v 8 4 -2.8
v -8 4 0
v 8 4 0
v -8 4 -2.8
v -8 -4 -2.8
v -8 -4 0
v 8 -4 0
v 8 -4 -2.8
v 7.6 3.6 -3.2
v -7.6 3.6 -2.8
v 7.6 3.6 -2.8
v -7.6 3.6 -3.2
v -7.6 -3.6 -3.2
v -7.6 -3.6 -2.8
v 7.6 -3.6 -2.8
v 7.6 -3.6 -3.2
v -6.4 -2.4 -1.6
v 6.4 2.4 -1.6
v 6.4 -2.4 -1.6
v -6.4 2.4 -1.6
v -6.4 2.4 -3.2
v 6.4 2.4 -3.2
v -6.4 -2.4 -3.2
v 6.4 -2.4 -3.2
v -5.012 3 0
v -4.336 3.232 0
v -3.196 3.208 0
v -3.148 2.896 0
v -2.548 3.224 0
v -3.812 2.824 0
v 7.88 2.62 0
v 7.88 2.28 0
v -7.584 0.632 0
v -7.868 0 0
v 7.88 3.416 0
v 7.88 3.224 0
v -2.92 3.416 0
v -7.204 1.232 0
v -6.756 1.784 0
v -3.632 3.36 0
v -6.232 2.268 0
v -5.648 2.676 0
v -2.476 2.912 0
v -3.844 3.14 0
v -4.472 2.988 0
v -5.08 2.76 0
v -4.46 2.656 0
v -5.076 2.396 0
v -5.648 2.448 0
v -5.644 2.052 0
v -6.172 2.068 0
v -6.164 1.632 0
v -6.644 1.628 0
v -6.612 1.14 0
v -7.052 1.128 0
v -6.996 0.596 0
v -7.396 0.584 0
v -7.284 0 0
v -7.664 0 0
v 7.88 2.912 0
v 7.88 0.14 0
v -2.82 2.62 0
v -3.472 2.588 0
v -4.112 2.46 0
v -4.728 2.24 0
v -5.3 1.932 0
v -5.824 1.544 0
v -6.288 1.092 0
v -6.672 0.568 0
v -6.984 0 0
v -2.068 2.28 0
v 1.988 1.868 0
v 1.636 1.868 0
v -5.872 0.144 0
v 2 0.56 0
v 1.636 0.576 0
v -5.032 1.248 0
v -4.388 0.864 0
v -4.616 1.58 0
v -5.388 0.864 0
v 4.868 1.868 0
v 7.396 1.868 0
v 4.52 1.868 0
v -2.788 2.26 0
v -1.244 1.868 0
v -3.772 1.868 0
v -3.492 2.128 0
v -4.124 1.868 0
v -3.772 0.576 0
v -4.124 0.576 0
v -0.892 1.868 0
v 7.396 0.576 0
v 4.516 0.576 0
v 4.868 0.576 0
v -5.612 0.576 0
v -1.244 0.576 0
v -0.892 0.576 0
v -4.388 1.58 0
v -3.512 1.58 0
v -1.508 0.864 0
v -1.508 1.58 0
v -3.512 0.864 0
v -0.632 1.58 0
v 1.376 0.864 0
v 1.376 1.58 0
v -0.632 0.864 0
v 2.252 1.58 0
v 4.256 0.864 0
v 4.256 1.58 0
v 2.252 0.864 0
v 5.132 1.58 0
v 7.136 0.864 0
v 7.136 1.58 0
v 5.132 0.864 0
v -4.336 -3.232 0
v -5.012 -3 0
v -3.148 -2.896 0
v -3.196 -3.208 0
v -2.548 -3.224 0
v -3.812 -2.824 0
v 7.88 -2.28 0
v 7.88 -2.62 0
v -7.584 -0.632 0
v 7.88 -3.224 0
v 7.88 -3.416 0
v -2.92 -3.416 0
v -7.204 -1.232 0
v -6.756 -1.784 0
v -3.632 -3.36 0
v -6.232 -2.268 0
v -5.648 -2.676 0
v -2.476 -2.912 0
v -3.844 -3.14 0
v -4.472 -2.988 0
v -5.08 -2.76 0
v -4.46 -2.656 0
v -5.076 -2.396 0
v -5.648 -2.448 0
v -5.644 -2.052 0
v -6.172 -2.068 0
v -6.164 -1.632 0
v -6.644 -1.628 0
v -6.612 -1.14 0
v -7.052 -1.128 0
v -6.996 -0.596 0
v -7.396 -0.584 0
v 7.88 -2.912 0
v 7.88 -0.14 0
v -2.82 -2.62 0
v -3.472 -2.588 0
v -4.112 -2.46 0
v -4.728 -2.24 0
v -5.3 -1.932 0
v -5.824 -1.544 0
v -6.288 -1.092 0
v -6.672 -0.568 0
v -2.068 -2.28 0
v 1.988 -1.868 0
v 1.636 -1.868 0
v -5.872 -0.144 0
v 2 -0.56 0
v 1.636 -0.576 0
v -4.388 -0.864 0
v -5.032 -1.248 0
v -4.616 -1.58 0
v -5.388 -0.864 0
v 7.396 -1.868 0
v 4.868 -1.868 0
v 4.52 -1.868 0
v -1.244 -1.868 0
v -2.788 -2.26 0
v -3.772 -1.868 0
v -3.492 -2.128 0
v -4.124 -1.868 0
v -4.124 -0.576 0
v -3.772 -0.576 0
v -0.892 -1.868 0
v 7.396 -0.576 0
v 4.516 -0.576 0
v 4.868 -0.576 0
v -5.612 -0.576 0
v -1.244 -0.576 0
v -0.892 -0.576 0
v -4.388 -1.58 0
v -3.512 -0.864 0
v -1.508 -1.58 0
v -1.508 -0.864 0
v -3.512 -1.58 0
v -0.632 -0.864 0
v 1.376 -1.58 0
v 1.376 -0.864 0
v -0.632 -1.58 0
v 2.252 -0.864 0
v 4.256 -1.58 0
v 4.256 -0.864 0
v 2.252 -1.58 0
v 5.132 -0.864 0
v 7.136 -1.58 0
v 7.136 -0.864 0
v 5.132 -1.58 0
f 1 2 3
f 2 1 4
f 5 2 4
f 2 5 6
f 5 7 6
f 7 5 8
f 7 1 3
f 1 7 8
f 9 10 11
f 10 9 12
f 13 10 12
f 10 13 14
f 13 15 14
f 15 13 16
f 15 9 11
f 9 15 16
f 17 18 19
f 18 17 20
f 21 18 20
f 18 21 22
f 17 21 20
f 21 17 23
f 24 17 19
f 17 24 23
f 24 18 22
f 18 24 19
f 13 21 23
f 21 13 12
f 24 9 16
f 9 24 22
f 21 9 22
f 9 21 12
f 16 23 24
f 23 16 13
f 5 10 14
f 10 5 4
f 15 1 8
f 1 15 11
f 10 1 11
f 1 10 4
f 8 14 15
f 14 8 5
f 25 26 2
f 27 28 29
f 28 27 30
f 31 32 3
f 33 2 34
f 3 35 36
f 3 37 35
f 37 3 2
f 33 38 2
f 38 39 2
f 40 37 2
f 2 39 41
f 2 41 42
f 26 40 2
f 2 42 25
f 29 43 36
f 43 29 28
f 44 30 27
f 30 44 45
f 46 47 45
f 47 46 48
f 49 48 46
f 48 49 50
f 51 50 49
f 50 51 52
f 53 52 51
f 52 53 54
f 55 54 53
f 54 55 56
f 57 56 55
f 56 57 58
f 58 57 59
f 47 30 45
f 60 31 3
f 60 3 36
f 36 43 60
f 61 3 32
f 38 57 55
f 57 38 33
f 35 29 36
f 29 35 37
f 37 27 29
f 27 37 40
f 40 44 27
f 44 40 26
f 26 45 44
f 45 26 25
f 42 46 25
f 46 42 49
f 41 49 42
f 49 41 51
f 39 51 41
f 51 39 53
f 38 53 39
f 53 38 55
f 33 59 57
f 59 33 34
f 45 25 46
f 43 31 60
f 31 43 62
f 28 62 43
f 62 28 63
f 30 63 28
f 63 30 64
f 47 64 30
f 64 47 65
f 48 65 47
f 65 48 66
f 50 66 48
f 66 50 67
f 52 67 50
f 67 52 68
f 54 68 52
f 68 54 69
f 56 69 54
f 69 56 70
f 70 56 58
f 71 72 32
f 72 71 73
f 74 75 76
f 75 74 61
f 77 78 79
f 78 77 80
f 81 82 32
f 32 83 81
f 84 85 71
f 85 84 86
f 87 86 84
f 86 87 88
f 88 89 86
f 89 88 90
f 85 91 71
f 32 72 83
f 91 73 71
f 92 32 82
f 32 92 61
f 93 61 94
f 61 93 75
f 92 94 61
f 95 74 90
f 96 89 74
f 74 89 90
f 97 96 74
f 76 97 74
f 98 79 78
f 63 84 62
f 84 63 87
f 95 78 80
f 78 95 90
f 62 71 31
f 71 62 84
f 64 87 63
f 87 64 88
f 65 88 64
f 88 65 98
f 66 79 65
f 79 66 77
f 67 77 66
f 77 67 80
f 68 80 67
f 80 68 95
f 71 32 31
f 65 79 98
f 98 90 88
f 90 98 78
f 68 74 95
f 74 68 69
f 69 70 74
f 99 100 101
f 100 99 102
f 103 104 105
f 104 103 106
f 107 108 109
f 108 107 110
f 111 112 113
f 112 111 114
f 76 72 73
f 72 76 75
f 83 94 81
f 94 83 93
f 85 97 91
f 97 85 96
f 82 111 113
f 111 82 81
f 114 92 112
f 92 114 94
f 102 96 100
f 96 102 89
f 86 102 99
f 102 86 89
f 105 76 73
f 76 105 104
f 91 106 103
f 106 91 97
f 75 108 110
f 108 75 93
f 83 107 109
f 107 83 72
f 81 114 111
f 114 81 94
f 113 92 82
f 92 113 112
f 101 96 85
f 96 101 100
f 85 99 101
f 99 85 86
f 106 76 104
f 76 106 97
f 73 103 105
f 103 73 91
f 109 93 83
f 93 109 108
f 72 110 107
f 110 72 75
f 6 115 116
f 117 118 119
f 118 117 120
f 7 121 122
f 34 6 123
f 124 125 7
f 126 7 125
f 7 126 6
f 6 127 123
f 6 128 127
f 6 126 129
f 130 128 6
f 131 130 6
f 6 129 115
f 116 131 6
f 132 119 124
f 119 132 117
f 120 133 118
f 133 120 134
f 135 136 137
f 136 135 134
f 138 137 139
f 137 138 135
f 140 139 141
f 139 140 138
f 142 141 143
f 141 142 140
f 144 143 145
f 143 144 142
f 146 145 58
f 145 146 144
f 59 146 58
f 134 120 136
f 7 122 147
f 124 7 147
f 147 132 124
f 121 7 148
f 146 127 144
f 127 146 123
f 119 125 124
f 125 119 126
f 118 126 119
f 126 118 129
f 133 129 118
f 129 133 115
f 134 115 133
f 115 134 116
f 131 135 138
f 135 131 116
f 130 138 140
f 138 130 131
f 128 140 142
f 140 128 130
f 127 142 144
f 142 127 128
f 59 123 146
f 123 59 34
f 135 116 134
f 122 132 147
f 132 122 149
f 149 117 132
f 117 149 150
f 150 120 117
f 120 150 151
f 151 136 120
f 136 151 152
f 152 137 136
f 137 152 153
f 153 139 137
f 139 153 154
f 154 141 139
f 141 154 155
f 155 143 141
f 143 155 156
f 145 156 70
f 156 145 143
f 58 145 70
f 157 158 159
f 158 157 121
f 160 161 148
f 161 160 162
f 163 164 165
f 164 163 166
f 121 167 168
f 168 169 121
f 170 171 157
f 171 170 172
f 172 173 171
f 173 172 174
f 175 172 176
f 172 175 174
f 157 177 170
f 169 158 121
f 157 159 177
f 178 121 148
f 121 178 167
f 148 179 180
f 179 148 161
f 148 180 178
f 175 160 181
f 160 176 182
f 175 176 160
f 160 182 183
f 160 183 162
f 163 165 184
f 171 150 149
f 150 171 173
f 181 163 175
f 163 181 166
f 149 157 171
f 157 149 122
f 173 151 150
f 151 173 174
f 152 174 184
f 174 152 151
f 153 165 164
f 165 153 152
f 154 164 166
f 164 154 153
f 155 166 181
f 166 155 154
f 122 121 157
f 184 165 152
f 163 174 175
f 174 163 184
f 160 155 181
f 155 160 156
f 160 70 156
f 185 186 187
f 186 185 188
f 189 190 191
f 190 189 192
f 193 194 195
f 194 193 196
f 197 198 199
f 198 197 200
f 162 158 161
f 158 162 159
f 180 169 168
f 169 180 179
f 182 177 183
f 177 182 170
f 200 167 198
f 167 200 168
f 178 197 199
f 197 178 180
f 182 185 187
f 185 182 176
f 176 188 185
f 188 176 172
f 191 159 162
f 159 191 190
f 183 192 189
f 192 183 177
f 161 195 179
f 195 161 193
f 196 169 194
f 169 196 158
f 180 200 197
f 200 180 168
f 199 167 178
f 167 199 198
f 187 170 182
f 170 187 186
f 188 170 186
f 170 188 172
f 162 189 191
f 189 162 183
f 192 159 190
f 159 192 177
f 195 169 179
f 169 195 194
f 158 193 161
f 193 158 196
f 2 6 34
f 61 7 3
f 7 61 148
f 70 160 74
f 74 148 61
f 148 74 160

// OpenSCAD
// file: ../p/box5.scad
use <../lib.scad>
function ldraw_lib__box5() = [
// 0 Box with 5 Faces and All Edges
// 0 Name: box5.dat
// 0 Author: James Jessiman
// 0 !LDRAW_ORG Primitive UPDATE 2012-01
// 0 !LICENSE Licensed under CC BY 4.0 : see CAreadme.txt
// 
// 0 BFC CERTIFY CCW
  [0,"BFC","CERTIFY"],
  [0,"BFC","CCW"],
// 
// 0 !HISTORY 2002-04-03 [sbliss] Modified for BFC compliance
// 0 !HISTORY 2002-04-25 [PTadmin] Official Update 2002-02
// 0 !HISTORY 2007-06-24 [PTadmin] Header formatted for Contributor Agreement
// 0 !HISTORY 2008-07-01 [PTadmin] Official Update 2008-01
// 0 !HISTORY 2012-02-16 [Philo] Changed to CCW
// 0 !HISTORY 2012-03-30 [PTadmin] Official Update 2012-01
// 
// 
// 2 24 1 1 1 -1 1 1
  [2,24,1,1,1,-1,1,1],
// 2 24 -1 1 1 -1 1 -1
  [2,24,-1,1,1,-1,1,-1],
// 2 24 -1 1 -1 1 1 -1
  [2,24,-1,1,-1,1,1,-1],
// 2 24 1 1 -1 1 1 1
  [2,24,1,1,-1,1,1,1],
// 2 24 1 0 1 -1 0 1
  [2,24,1,0,1,-1,0,1],
// 2 24 -1 0 1 -1 0 -1
  [2,24,-1,0,1,-1,0,-1],
// 2 24 -1 0 -1 1 0 -1
  [2,24,-1,0,-1,1,0,-1],
// 2 24 1 0 -1 1 0 1
  [2,24,1,0,-1,1,0,1],
// 2 24 1 0 1 1 1 1
  [2,24,1,0,1,1,1,1],
// 2 24 -1 0 1 -1 1 1
  [2,24,-1,0,1,-1,1,1],
// 2 24 1 0 -1 1 1 -1
  [2,24,1,0,-1,1,1,-1],
// 2 24 -1 0 -1 -1 1 -1
  [2,24,-1,0,-1,-1,1,-1],
// 4 16 -1 1 1 1 1 1 1 1 -1 -1 1 -1
  [4,16,-1,1,1,1,1,1,1,1,-1,-1,1,-1],
// 4 16 -1 1 1 -1 0 1 1 0 1 1 1 1
  [4,16,-1,1,1,-1,0,1,1,0,1,1,1,1],
// 4 16 -1 1 -1 -1 0 -1 -1 0 1 -1 1 1
  [4,16,-1,1,-1,-1,0,-1,-1,0,1,-1,1,1],
// 4 16 1 1 -1 1 0 -1 -1 0 -1 -1 1 -1
  [4,16,1,1,-1,1,0,-1,-1,0,-1,-1,1,-1],
// 4 16 1 1 1 1 0 1 1 0 -1 1 1 -1
  [4,16,1,1,1,1,0,1,1,0,-1,1,1,-1],
];
module ldraw_lib__box5(step=0, col=false, unit=2/5, alt=false, line=0.2, solid=!$preview)
    makepoly(ldraw_lib__box5(), step=step, col=col, unit=unit, alt=alt, line=line, solid=solid);
ldraw_lib__box5(line=0.2);
// file: ../p/box4.scad
use <../lib.scad>
function ldraw_lib__box4() = [
// 0 Box with 4 Faces (2 Parallel Pairs) and All Edges
// 0 Name: box4.dat
// 0 Author: James Jessiman
// 0 !LDRAW_ORG Primitive UPDATE 2012-01
// 0 !LICENSE Licensed under CC BY 4.0 : see CAreadme.txt
// 
// 0 BFC CERTIFY CCW
  [0,"BFC","CERTIFY"],
  [0,"BFC","CCW"],
// 
// 0 !HISTORY 2002-04-03 [sbliss] Modified for BFC compliance
// 0 !HISTORY 2002-04-25 [PTadmin] Official Update 2002-02
// 0 !HISTORY 2007-06-24 [PTadmin] Header formatted for Contributor Agreement
// 0 !HISTORY 2008-07-01 [PTadmin] Official Update 2008-01
// 0 !HISTORY 2012-02-16 [Philo] Changed to CCW
// 0 !HISTORY 2012-03-30 [PTadmin] Official Update 2012-01
// 
// 
// 2 24 1 1 1 -1 1 1
  [2,24,1,1,1,-1,1,1],
// 2 24 -1 1 1 -1 1 -1
  [2,24,-1,1,1,-1,1,-1],
// 2 24 -1 1 -1 1 1 -1
  [2,24,-1,1,-1,1,1,-1],
// 2 24 1 1 -1 1 1 1
  [2,24,1,1,-1,1,1,1],
// 2 24 1 0 1 -1 0 1
  [2,24,1,0,1,-1,0,1],
// 2 24 -1 0 1 -1 0 -1
  [2,24,-1,0,1,-1,0,-1],
// 2 24 -1 0 -1 1 0 -1
  [2,24,-1,0,-1,1,0,-1],
// 2 24 1 0 -1 1 0 1
  [2,24,1,0,-1,1,0,1],
// 2 24 1 0 1 1 1 1
  [2,24,1,0,1,1,1,1],
// 2 24 -1 0 1 -1 1 1
  [2,24,-1,0,1,-1,1,1],
// 2 24 1 0 -1 1 1 -1
  [2,24,1,0,-1,1,1,-1],
// 2 24 -1 0 -1 -1 1 -1
  [2,24,-1,0,-1,-1,1,-1],
// 4 16 -1 1 1 -1 0 1 1 0 1 1 1 1
  [4,16,-1,1,1,-1,0,1,1,0,1,1,1,1],
// 4 16 -1 1 -1 -1 0 -1 -1 0 1 -1 1 1
  [4,16,-1,1,-1,-1,0,-1,-1,0,1,-1,1,1],
// 4 16 1 1 -1 1 0 -1 -1 0 -1 -1 1 -1
  [4,16,1,1,-1,1,0,-1,-1,0,-1,-1,1,-1],
// 4 16 1 1 1 1 0 1 1 0 -1 1 1 -1
  [4,16,1,1,1,1,0,1,1,0,-1,1,1,-1],
];
module ldraw_lib__box4(step=0, col=false, unit=2/5, alt=false, line=0.2, solid=!$preview)
    makepoly(ldraw_lib__box4(), step=step, col=col, unit=unit, alt=alt, line=line, solid=solid);
ldraw_lib__box4(line=0.2);
// file: s/3069bs01.scad
use <../../lib.scad>
use <../../p/box4.scad>
use <../../p/box5.scad>
function ldraw_lib__s__3069bs01() = [
// 0 ~Tile  1 x  2 with Groove without Top Face
// 0 Name: s\3069bs01.dat
// 0 Author: Santeri Piippo [arezey]
// 0 !LDRAW_ORG Subpart UPDATE 2010-02
// 0 !LICENSE Licensed under CC BY 4.0 : see CAreadme.txt
// 
// 0 BFC CERTIFY CCW
  [0,"BFC","CERTIFY"],
  [0,"BFC","CCW"],
// 
// 0 !HISTORY 2010-07-05 [PTadmin] Official Update 2010-02
// 
// 
// 1 16 0 0 0 20 0 0 0 7 0 0 0 10 box4.dat
  [1,16,0,0,0,20,0,0,0,7,0,0,0,10, ldraw_lib__box4()],
// 1 16 0 7 0 19 0 0 0 1 0 0 0 9 box4.dat
  [1,16,0,7,0,19,0,0,0,1,0,0,0,9, ldraw_lib__box4()],
// 0 BFC INVERTNEXT
  [0,"BFC","INVERTNEXT"],
// 1 16 0 8 0 16 0 0 0 -4 0 0 0 6 box5.dat
  [1,16,0,8,0,16,0,0,0,-4,0,0,0,6, ldraw_lib__box5()],
// 4 16 -19 8 9 -16 8 6 -16 8 -6 -19 8 -9
  [4,16,-19,8,9,-16,8,6,-16,8,-6,-19,8,-9],
// 4 16 19 8 -9 16 8 -6 16 8 6 19 8 9
  [4,16,19,8,-9,16,8,-6,16,8,6,19,8,9],
// 4 16 19 8 9 16 8 6 -16 8 6 -19 8 9
  [4,16,19,8,9,16,8,6,-16,8,6,-19,8,9],
// 4 16 -19 8 -9 -16 8 -6 16 8 -6 19 8 -9
  [4,16,-19,8,-9,-16,8,-6,16,8,-6,19,8,-9],
// 4 16 -20 7 10 -19 7 9 -19 7 -9 -20 7 -10
  [4,16,-20,7,10,-19,7,9,-19,7,-9,-20,7,-10],
// 4 16 20 7 -10 19 7 -9 19 7 9 20 7 10
  [4,16,20,7,-10,19,7,-9,19,7,9,20,7,10],
// 4 16 20 7 10 19 7 9 -19 7 9 -20 7 10
  [4,16,20,7,10,19,7,9,-19,7,9,-20,7,10],
// 4 16 -20 7 -10 -19 7 -9 19 7 -9 20 7 -10
  [4,16,-20,7,-10,-19,7,-9,19,7,-9,20,7,-10],
// 0 //
];
module ldraw_lib__s__3069bs01(step=0, col=false, unit=2/5, alt=false, line=0.2, solid=!$preview)
    makepoly(ldraw_lib__s__3069bs01(), step=step, col=col, unit=unit, alt=alt, line=line, solid=solid);
ldraw_lib__s__3069bs01(line=0.2);
// main file
use <../lib.scad>
use <s/3069bp1es01.scad>
use <s/3069bs01.scad>
function ldraw_lib__3069bp1e() = [
// 0 Tile  1 x  2 with Arched Wooden Door Pattern
// 0 Name: 3069bp1e.dat
// 0 Author: Philippe Hurbain [Philo]
// 0 !LDRAW_ORG Part UPDATE 2025-07
// 0 !LICENSE Licensed under CC BY 4.0 : see CAreadme.txt
// 
// 0 BFC CERTIFY CCW
  [0,"BFC","CERTIFY"],
  [0,"BFC","CCW"],
// 
// 0 !KEYWORDS Bricklink 3069pb1191, Castle, Harry Potter, Hogwarts, HP
// 0 !KEYWORDS Rebrickable 3069bpr0391, Set 76419
// 
// 0 !HISTORY 2025-07-27 [OrionP] Official Update 2025-07
// 
// 1 16 0 0 0 1 0 0 0 1 0 0 0 1 s\3069bs01.dat
  [1,16,0,0,0,1,0,0,0,1,0,0,0,1, ldraw_lib__s__3069bs01()],
// 1 16 0 0 0 1 0 0 0 1 0 0 0 1 s\3069bp1es01.dat
  [1,16,0,0,0,1,0,0,0,1,0,0,0,1, ldraw_lib__s__3069bp1es01()],
// 1 16 0 0 0 1 0 0 0 1 0 0 0 -1 s\3069bp1es01.dat
  [1,16,0,0,0,1,0,0,0,1,0,0,0,-1, ldraw_lib__s__3069bp1es01()],
// 
// 3 16 -20 0 10 -20 0 -10 -19.67 0 0
  [3,16,-20,0,10,-20,0,-10,-19.67,0,0],
// 4 16 20 0 10 19.7 0 .35 19.7 0 -.35 20 0 -10
  [4,16,20,0,10,19.7,0,.35,19.7,0,-.35,20,0,-10],
// 3 308 -17.46 0 0 -14.68 0 -.36 -14.68 0 .36
  [3,308,-17.46,0,0,-14.68,0,-.36,-14.68,0,.36],
// 4 308 -14.68 0 .36 -14.68 0 -.36 19.7 0 -.35 19.7 0 .35
  [4,308,-14.68,0,.36,-14.68,0,-.36,19.7,0,-.35,19.7,0,.35],
];
module ldraw_lib__3069bp1e(step=0, col=false, unit=2/5, alt=false, line=0.2, solid=!$preview)
    makepoly(ldraw_lib__3069bp1e(), step=step, col=col, unit=unit, alt=alt, line=line, solid=solid);
ldraw_lib__3069bp1e(line=0.2);
